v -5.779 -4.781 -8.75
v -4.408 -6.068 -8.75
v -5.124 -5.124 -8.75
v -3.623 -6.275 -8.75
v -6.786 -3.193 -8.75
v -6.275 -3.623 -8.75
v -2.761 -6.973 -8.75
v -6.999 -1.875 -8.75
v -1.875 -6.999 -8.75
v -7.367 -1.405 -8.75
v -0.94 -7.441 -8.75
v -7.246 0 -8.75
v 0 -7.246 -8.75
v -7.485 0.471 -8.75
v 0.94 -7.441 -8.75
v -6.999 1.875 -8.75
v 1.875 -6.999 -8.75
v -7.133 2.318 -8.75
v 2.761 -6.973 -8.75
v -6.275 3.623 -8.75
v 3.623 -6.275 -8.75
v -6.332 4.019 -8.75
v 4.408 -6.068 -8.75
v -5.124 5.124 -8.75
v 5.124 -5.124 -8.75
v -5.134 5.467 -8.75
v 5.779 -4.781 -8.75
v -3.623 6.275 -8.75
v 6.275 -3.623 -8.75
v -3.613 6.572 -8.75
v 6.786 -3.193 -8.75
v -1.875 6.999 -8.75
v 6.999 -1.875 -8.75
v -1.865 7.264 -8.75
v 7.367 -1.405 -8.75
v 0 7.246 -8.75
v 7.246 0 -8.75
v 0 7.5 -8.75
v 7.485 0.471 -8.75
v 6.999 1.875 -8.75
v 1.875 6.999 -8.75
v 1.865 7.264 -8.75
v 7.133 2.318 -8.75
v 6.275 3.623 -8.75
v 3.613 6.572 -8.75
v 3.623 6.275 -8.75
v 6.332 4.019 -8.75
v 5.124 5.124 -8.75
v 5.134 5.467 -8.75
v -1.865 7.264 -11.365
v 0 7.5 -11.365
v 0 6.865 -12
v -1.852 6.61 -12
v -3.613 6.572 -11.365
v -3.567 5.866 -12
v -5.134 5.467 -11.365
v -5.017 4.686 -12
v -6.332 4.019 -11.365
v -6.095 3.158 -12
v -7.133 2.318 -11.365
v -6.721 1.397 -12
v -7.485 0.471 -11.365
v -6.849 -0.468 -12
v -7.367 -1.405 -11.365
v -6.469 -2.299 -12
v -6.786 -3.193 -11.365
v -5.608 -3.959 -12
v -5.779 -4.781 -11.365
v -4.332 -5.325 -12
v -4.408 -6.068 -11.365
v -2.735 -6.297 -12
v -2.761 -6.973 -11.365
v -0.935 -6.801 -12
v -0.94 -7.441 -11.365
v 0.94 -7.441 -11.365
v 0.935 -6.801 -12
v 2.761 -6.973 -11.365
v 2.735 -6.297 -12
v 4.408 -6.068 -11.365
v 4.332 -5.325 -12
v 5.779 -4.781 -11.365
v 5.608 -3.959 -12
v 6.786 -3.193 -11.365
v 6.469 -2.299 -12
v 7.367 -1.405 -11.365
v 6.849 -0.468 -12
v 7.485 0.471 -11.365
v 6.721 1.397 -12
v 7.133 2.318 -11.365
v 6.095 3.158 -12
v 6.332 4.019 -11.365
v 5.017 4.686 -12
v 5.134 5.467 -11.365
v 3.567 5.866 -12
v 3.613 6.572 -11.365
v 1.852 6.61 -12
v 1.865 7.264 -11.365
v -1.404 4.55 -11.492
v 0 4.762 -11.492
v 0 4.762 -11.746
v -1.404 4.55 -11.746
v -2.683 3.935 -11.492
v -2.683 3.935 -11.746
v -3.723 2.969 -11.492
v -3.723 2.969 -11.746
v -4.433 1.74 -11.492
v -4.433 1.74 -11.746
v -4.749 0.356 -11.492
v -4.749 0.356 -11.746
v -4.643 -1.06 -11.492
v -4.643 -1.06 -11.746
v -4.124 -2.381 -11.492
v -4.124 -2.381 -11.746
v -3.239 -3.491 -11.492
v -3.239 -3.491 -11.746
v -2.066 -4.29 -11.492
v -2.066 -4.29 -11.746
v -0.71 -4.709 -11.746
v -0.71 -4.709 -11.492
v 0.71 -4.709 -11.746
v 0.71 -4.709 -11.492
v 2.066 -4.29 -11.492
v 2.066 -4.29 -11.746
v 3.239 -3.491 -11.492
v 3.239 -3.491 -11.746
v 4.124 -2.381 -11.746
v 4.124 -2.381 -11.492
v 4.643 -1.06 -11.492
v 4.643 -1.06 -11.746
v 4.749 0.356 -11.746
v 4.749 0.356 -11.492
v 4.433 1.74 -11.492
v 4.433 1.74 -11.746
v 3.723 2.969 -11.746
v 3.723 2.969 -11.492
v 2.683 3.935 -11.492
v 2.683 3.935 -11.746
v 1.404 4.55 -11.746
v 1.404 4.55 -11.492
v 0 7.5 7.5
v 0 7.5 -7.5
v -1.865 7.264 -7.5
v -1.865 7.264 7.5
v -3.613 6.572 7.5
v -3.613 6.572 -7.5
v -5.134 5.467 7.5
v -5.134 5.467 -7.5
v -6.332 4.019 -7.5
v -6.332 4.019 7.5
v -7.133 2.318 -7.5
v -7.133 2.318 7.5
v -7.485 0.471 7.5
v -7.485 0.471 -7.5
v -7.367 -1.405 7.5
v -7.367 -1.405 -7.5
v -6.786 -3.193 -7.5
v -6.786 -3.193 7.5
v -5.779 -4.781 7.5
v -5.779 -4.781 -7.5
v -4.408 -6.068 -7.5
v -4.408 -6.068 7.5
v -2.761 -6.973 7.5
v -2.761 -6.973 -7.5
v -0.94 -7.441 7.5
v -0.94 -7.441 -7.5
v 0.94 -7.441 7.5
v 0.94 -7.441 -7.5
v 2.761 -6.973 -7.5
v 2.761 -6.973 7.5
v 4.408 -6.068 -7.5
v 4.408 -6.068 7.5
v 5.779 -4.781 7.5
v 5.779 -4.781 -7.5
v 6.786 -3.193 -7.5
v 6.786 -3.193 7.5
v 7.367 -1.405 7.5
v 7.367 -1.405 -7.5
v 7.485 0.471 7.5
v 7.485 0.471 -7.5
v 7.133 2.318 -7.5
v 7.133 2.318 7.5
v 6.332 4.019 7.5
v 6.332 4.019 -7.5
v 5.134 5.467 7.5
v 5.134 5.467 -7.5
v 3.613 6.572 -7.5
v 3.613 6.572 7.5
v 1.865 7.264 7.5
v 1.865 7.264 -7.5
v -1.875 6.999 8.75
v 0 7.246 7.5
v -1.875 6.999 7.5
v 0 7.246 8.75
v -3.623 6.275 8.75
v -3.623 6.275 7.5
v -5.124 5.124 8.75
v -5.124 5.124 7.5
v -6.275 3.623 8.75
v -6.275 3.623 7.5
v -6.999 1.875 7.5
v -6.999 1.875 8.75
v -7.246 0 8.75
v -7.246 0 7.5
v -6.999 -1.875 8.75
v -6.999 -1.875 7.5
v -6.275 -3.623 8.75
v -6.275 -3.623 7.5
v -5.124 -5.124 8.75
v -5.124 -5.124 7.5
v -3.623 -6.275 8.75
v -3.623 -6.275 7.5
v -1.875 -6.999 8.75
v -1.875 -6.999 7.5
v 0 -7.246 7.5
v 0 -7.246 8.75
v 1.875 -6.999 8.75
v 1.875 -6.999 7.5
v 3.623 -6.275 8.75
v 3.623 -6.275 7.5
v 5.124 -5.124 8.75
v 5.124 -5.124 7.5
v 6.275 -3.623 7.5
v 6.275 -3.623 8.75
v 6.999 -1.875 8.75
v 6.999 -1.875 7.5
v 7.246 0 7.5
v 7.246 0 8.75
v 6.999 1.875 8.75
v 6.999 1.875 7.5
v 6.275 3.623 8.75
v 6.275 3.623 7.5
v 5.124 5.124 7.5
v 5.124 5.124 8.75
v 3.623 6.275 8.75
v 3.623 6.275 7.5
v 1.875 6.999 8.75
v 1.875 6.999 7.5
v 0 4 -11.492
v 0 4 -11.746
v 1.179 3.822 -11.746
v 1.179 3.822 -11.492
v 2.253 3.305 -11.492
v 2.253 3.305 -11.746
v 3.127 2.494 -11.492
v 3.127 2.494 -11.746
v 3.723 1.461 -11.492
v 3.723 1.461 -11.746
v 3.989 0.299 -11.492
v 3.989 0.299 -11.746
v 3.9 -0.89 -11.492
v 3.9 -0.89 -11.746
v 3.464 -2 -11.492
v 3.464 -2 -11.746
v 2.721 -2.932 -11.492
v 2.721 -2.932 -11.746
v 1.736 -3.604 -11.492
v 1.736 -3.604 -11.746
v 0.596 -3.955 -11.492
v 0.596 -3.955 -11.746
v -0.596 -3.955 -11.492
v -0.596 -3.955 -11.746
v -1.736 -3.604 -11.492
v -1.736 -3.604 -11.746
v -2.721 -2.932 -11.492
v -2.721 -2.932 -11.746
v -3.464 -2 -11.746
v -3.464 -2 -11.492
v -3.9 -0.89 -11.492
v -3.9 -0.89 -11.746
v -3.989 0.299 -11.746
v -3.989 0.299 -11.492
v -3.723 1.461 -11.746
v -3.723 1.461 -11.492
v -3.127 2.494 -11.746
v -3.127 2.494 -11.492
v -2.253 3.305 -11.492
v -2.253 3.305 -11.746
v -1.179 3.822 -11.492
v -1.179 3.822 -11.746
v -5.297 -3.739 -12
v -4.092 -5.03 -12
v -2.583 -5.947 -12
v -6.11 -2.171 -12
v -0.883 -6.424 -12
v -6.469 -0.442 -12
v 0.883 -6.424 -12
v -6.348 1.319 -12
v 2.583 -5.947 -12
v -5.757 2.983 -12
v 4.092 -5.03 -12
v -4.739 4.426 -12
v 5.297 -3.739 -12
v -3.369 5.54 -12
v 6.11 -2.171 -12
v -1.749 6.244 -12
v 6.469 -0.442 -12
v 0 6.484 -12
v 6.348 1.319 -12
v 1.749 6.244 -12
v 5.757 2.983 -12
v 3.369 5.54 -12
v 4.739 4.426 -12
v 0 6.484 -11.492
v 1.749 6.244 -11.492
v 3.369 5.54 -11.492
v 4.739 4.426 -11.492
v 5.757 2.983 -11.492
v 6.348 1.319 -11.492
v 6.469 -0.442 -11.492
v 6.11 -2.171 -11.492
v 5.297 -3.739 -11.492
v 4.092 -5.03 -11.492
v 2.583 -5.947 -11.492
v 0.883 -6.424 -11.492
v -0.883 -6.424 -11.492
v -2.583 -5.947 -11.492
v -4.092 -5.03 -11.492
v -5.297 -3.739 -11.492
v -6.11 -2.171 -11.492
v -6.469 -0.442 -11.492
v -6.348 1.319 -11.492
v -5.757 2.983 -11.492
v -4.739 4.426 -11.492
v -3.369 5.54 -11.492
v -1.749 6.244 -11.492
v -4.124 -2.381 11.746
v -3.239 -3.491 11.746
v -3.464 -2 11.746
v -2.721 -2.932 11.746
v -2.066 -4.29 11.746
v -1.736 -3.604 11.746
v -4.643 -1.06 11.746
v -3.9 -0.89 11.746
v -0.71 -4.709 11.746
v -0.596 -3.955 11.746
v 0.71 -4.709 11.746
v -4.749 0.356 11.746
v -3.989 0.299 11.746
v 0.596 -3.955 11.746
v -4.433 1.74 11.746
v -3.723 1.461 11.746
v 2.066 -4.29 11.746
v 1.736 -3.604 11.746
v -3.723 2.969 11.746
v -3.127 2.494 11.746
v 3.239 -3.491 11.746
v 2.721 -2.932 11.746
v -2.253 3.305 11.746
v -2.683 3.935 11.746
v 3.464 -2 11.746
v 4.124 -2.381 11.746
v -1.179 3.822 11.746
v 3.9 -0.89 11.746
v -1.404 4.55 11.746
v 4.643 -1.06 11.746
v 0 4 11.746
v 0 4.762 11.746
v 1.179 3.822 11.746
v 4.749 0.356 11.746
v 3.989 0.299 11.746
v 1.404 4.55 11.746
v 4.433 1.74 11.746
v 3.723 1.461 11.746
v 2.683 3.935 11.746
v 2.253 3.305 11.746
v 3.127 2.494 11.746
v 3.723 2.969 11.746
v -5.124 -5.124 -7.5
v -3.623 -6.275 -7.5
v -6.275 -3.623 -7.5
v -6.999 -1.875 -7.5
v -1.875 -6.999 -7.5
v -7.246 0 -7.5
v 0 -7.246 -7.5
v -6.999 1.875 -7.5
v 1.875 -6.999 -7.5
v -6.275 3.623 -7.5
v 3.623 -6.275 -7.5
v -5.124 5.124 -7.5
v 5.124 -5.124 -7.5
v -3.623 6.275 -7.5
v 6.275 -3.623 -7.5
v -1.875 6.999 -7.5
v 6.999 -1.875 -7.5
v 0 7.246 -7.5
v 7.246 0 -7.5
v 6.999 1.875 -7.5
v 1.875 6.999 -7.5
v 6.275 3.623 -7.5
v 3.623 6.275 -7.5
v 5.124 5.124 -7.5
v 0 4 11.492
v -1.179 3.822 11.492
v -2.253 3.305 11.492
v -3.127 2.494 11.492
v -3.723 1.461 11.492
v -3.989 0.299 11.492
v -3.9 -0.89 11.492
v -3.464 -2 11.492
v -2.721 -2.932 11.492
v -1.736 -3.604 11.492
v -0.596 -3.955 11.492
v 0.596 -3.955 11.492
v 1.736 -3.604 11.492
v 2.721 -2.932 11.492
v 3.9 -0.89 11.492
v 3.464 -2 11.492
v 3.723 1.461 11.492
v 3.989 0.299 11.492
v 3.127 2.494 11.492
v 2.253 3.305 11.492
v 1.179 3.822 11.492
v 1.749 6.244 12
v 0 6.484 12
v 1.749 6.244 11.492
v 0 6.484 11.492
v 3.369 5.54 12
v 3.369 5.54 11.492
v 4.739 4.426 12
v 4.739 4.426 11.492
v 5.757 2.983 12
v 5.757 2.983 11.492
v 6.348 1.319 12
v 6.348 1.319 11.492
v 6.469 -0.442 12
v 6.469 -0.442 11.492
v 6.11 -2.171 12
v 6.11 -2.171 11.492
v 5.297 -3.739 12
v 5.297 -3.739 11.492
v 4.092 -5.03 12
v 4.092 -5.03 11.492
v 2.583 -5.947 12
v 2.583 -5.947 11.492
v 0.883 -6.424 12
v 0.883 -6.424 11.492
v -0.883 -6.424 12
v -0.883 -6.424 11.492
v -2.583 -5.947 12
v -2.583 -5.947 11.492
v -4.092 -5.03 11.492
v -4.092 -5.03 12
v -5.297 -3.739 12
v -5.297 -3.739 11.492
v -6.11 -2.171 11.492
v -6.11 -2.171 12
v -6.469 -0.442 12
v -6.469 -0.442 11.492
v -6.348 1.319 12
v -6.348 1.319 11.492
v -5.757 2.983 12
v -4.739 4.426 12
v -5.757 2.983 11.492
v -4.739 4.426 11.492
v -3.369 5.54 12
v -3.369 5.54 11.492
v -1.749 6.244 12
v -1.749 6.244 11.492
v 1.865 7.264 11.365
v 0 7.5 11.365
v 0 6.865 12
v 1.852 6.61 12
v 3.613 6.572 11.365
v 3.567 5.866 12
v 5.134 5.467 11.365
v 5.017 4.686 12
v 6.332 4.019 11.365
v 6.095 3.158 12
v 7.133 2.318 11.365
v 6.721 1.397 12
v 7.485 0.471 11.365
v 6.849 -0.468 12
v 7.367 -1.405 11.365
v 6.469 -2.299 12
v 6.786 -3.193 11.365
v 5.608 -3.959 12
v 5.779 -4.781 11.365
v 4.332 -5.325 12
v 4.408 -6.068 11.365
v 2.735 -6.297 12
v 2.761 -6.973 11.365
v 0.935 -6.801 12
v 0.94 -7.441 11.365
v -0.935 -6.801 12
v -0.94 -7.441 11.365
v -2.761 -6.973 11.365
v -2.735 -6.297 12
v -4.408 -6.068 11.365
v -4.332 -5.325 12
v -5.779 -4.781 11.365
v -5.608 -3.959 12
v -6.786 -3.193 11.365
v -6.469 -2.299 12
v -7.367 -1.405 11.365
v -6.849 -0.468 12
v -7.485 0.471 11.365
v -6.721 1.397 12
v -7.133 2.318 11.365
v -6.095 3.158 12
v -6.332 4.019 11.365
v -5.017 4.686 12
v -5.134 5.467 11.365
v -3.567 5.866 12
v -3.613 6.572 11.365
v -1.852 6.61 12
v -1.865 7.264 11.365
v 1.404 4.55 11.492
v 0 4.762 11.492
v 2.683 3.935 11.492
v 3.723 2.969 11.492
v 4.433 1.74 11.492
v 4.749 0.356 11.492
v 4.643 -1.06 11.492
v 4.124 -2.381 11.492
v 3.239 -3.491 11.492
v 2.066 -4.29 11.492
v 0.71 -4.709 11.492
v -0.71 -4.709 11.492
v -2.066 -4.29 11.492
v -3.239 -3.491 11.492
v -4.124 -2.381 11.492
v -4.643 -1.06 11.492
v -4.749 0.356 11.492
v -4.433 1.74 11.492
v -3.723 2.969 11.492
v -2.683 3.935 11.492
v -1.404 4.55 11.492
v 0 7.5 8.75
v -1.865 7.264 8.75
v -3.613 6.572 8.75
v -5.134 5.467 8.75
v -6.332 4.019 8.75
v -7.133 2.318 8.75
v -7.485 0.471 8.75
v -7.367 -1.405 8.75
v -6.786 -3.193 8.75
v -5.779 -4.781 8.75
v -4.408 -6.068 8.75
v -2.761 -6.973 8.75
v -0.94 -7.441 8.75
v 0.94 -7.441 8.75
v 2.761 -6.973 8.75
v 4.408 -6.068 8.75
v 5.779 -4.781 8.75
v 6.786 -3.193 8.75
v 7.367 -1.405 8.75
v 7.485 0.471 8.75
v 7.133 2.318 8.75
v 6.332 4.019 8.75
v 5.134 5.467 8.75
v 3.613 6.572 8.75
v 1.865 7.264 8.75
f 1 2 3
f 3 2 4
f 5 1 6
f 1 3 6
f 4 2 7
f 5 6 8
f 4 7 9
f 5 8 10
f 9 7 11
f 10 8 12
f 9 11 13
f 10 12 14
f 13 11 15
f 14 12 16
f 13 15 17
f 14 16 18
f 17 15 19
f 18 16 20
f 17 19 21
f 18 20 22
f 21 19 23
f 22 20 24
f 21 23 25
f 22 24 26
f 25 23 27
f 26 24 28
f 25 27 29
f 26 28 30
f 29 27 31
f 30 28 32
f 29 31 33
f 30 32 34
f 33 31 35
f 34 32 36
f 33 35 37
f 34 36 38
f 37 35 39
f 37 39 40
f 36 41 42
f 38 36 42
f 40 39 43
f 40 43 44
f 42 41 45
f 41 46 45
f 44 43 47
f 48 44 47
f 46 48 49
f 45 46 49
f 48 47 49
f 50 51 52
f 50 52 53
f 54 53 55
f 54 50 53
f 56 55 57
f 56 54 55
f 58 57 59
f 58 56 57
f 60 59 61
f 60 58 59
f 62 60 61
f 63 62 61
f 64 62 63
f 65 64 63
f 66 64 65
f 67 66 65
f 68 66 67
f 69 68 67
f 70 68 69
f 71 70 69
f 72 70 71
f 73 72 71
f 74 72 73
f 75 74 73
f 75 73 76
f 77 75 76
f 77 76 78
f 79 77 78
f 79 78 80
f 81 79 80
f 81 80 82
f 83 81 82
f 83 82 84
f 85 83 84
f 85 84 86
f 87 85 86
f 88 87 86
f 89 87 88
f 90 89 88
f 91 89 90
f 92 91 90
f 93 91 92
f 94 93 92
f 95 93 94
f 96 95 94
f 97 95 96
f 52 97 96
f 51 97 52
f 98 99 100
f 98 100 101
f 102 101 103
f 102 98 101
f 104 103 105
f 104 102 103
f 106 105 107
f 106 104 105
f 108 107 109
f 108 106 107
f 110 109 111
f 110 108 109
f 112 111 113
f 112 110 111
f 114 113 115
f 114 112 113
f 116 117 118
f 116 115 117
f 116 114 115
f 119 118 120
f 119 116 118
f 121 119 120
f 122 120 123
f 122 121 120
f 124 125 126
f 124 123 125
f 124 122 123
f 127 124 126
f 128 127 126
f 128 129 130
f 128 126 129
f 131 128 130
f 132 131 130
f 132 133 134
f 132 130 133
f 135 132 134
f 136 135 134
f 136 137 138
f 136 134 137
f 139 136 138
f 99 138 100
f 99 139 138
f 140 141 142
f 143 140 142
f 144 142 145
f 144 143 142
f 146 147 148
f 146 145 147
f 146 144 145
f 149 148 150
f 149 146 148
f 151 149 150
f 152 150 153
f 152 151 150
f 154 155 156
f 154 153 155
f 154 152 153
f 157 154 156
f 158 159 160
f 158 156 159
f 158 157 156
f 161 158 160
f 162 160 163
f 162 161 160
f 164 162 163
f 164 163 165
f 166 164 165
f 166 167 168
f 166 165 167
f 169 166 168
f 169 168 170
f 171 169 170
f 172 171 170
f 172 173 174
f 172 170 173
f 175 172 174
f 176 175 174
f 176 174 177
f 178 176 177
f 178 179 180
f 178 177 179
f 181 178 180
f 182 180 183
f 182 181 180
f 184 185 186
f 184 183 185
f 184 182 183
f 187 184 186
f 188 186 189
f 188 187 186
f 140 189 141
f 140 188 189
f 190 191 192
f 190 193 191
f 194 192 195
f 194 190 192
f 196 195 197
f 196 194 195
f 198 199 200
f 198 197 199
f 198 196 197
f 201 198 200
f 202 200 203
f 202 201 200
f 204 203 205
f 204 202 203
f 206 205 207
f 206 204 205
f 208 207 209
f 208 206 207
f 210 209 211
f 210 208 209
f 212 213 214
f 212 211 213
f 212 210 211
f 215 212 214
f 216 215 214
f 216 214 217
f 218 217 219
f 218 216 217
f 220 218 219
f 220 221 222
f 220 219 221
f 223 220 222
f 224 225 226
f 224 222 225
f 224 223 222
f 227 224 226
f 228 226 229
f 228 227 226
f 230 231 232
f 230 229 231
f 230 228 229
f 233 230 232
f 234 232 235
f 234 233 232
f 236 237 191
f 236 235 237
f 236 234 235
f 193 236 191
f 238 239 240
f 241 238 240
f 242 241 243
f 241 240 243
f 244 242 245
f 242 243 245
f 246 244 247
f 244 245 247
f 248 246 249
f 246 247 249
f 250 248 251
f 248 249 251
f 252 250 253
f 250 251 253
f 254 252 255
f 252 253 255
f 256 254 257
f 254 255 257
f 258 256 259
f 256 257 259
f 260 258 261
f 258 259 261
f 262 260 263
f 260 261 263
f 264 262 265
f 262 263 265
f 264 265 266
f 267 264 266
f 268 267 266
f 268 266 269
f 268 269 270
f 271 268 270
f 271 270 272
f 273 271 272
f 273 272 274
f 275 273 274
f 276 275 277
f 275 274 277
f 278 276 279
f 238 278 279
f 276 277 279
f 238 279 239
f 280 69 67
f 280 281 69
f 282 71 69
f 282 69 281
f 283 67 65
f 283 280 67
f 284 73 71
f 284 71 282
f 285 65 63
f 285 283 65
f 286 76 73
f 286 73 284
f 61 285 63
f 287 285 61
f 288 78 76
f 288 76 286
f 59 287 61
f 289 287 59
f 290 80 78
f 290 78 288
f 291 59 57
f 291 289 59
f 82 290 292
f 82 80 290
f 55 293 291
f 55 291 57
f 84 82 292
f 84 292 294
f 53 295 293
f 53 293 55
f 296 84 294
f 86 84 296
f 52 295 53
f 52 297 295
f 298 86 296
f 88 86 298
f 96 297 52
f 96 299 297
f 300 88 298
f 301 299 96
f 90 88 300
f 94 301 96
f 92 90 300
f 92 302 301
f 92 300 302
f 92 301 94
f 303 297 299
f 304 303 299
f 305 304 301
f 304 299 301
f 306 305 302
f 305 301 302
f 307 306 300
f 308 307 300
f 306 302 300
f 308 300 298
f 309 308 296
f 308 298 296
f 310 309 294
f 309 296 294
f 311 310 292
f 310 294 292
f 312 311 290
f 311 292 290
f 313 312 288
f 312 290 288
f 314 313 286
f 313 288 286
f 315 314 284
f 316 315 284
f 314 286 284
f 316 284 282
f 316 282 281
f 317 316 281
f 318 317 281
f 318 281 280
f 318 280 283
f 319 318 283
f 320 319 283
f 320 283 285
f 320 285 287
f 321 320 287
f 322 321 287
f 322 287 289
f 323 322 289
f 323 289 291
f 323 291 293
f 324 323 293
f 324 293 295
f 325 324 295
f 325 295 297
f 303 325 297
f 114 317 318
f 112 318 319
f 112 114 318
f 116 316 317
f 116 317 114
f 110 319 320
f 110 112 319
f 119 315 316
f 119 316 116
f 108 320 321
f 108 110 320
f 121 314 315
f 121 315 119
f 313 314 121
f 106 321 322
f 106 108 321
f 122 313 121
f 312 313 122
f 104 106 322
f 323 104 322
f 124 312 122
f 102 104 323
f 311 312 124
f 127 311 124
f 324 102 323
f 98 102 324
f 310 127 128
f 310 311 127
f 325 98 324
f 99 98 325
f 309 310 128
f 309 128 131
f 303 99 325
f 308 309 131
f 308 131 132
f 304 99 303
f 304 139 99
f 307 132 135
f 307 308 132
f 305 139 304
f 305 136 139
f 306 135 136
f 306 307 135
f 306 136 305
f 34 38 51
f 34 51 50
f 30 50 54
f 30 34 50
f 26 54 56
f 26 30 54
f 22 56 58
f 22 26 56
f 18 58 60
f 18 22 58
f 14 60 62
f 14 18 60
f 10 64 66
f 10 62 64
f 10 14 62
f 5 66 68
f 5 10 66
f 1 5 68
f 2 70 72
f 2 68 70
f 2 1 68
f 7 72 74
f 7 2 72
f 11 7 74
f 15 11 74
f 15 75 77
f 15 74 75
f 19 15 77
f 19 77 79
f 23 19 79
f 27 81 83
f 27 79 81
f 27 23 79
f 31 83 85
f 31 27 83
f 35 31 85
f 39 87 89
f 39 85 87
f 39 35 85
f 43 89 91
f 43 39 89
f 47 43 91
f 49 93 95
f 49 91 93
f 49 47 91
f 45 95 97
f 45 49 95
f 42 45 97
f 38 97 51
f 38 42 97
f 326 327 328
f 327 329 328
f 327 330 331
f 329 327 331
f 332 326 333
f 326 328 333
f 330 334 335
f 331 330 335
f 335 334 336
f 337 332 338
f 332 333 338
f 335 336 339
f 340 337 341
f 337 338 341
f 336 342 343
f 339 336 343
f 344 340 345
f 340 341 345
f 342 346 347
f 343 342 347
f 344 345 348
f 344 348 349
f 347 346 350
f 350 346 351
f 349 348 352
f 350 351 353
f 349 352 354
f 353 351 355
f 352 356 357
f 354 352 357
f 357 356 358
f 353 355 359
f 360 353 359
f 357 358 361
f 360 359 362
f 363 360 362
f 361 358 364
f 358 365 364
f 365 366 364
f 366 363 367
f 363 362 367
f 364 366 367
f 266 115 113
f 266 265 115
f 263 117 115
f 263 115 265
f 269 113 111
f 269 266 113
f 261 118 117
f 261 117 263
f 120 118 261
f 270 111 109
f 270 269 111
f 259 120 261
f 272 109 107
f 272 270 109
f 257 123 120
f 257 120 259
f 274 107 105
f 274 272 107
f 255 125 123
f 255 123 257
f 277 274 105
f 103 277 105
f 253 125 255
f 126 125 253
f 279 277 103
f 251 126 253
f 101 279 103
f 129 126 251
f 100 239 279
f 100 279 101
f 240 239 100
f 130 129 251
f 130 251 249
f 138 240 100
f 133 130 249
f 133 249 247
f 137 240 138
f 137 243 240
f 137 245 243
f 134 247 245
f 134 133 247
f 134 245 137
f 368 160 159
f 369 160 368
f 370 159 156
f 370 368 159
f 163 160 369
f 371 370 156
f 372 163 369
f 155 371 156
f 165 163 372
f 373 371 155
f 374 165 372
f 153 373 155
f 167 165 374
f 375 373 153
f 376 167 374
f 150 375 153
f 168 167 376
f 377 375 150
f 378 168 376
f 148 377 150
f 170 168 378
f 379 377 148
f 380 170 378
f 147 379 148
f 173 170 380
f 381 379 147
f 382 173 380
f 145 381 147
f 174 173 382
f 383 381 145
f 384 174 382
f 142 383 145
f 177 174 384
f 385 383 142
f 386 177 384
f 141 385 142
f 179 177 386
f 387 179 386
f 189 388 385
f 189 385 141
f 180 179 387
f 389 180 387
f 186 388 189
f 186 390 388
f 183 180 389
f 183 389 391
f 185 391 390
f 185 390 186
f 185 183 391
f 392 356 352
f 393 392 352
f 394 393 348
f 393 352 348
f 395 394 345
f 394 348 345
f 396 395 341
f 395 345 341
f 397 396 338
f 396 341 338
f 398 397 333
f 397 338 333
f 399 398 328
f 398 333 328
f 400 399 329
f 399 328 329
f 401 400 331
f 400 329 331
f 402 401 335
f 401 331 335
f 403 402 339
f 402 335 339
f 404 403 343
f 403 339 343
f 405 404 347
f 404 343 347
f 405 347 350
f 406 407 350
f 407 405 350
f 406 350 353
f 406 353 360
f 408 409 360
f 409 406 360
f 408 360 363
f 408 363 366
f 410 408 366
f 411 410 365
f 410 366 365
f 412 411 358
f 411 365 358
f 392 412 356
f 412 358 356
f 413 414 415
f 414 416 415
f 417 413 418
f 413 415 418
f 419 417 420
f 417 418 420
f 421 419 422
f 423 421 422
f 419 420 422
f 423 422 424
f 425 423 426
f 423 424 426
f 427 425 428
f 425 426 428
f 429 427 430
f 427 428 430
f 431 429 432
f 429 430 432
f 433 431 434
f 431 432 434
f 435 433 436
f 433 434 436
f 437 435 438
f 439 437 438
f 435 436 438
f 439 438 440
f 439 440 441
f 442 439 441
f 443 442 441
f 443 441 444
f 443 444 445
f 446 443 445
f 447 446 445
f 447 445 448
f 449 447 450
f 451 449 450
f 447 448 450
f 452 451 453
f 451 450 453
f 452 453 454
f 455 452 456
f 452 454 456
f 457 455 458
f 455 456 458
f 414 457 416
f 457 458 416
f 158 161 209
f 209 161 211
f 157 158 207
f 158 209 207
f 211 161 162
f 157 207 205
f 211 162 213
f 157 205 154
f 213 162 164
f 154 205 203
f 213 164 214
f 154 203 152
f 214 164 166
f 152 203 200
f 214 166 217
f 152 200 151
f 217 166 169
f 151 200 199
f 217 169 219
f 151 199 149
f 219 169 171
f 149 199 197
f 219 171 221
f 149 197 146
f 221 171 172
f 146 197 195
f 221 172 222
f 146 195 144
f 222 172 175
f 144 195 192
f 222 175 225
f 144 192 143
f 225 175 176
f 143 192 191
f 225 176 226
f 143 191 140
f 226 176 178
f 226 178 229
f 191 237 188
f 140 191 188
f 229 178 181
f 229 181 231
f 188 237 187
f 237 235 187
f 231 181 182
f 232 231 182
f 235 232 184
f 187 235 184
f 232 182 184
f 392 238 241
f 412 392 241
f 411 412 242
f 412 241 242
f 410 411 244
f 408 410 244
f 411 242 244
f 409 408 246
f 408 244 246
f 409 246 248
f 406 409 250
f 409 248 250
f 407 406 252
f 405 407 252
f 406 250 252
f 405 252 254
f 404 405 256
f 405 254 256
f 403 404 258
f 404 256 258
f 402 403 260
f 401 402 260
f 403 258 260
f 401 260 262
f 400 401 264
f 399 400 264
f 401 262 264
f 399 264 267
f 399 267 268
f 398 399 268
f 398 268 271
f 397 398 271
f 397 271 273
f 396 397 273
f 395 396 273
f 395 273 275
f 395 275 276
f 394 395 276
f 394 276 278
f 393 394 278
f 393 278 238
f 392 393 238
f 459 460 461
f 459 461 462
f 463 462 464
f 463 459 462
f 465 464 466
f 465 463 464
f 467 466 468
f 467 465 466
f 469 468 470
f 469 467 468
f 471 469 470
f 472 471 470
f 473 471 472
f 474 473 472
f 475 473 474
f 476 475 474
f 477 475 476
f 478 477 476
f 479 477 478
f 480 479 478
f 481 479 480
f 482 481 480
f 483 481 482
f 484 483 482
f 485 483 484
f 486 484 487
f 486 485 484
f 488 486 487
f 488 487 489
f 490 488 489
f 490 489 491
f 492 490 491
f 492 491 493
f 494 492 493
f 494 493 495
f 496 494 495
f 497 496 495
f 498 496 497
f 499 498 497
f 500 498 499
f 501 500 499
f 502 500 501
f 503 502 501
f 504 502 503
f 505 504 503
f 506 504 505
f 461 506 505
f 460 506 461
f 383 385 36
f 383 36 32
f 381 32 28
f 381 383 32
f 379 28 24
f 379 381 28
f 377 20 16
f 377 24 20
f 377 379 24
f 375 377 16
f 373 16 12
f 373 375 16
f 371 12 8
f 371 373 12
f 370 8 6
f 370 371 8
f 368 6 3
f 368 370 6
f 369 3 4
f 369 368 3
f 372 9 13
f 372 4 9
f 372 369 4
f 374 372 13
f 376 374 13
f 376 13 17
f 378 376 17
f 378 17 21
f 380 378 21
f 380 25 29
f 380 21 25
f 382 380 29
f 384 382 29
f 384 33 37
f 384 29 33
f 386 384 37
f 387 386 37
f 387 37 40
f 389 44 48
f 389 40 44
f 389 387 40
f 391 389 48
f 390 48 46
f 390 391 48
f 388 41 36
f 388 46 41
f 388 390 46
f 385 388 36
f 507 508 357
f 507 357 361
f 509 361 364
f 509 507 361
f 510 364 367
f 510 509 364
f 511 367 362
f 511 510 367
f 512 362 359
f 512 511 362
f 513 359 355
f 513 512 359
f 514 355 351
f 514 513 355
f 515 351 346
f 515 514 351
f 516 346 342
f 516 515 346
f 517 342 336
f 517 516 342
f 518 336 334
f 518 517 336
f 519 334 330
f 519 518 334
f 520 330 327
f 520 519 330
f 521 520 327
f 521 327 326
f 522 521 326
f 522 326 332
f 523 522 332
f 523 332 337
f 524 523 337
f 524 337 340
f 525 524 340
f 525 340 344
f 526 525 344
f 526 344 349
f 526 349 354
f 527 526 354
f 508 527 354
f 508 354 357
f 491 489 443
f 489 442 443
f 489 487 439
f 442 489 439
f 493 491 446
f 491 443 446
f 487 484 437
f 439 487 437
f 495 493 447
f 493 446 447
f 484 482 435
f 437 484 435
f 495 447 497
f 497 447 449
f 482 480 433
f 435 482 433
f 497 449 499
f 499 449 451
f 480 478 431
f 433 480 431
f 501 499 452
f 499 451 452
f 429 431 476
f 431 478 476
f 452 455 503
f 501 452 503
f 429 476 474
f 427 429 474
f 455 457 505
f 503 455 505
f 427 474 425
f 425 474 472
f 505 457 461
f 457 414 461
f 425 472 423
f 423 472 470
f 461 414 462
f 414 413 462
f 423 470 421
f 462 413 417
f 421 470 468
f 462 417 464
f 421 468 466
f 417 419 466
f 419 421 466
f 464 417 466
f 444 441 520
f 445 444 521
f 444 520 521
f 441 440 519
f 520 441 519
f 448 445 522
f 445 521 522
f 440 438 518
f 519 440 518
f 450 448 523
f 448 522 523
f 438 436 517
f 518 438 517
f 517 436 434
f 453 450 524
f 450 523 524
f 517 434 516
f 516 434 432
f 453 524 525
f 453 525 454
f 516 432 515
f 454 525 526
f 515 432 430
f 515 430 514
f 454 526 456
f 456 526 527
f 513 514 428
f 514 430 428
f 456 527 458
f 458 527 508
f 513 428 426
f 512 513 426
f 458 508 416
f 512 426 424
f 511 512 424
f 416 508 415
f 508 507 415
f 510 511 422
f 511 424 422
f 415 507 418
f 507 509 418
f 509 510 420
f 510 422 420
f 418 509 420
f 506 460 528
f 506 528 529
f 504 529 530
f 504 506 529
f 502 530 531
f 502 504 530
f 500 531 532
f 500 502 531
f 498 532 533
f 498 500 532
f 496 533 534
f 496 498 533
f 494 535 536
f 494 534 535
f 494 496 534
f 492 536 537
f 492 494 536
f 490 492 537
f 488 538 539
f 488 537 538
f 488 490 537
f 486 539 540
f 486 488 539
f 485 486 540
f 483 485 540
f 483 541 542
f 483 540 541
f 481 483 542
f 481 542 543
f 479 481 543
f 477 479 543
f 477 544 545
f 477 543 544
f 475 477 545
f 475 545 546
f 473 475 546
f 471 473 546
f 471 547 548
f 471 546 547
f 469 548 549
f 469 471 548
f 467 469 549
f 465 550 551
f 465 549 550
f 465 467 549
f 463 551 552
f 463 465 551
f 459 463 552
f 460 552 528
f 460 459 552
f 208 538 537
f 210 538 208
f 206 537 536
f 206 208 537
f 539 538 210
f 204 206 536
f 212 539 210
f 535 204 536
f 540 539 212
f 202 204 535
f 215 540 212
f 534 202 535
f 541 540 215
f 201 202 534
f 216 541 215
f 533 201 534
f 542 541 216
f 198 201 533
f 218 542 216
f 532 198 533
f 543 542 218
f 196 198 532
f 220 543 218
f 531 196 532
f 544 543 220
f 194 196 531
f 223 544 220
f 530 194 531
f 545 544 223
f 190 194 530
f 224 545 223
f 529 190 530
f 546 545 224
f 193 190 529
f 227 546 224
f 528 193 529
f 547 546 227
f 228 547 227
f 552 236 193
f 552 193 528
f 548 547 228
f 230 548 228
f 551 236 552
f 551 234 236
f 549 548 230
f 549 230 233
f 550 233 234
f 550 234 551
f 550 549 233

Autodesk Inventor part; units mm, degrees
ref_plane "YZ Plane" through (0, 0, 0) normal (1, 0, 0) x (0, 1, 0)
ref_plane "XZ Plane" through (0, 0, 0) normal (0, 1, 0) x (-1, 0, 0)
ref_plane "XY Plane" through (0, 0, 0) normal (0, 0, 1) x (1, 0, 0)
sketch "Sketch1" plane through (0, 0, 0) normal (1, 0, 0) x (0, 1, 0)
  line L0 (4, 11.492) -> (4, -11.492)
  line L1 (4, -11.492) -> (6.484, -11.492)
  line L2 (6.484, -11.492) -> (6.484, -12)
  line L3 (6.484, -12) -> (7.5, -12)
  line L4 (7.5, -12) -> (7.5, -8.75)
  line L5 (7.5, -8.75) -> (7.246, -8.75)
  line L6 (7.246, -8.75) -> (7.246, -7.5)
  line L7 (7.246, -7.5) -> (7.5, -7.5)
  line L8 (7.5, -7.5) -> (7.5, 7.5)
  line L9 (7.5, 7.5) -> (7.246, 7.5)
  line L10 (7.246, 7.5) -> (7.246, 8.75)
  line L11 (7.246, 8.75) -> (7.5, 8.75)
  line L12 (7.5, 8.75) -> (7.5, 12)
  line L13 (7.5, 12) -> (6.484, 12)
  line L14 (6.484, 12) -> (6.484, 11.492)
  line L15 (6.484, 11.492) -> (4, 11.492)
  line L16 (0, 0) -> (0, -1.7143)
  line L17 (4, 11.492) -> (4, 11.746)
  line L18 (4, 11.746) -> (4.762, 11.746)
  line L19 (4.762, 11.746) -> (4.762, 11.492)
  line L20 (4, -11.492) -> (4, -11.746)
  line L21 (4, -11.746) -> (4.762, -11.746)
  line L22 (4.762, -11.746) -> (4.762, -11.492)
  point P0 (4, 0)
  point P1 (7.5, 0)
  dimension "d0" = 8
  dimension "d1" = 15
  dimension "d2" = 24
  dimension "d3" = 1.016
  dimension "d4" = 0.254
  dimension "d5" = 0.762
  dimension "d6" = 0.508
  dimension "d7" = 1.25
  dimension "d8" = 0.254
  dimension "d9" = 15
revolve "Revolution1" add sketch "Sketch1" angle 360 about axis through (0, 0, 0) along (0, 0, -1)
chamfer "Chamfer1" distance 0.635 angle 45 2 edges at (0, -7.5, 12) (0, -7.5, -12)
properties part number "8mm Linear Bearing" material "Stainless Steel"
